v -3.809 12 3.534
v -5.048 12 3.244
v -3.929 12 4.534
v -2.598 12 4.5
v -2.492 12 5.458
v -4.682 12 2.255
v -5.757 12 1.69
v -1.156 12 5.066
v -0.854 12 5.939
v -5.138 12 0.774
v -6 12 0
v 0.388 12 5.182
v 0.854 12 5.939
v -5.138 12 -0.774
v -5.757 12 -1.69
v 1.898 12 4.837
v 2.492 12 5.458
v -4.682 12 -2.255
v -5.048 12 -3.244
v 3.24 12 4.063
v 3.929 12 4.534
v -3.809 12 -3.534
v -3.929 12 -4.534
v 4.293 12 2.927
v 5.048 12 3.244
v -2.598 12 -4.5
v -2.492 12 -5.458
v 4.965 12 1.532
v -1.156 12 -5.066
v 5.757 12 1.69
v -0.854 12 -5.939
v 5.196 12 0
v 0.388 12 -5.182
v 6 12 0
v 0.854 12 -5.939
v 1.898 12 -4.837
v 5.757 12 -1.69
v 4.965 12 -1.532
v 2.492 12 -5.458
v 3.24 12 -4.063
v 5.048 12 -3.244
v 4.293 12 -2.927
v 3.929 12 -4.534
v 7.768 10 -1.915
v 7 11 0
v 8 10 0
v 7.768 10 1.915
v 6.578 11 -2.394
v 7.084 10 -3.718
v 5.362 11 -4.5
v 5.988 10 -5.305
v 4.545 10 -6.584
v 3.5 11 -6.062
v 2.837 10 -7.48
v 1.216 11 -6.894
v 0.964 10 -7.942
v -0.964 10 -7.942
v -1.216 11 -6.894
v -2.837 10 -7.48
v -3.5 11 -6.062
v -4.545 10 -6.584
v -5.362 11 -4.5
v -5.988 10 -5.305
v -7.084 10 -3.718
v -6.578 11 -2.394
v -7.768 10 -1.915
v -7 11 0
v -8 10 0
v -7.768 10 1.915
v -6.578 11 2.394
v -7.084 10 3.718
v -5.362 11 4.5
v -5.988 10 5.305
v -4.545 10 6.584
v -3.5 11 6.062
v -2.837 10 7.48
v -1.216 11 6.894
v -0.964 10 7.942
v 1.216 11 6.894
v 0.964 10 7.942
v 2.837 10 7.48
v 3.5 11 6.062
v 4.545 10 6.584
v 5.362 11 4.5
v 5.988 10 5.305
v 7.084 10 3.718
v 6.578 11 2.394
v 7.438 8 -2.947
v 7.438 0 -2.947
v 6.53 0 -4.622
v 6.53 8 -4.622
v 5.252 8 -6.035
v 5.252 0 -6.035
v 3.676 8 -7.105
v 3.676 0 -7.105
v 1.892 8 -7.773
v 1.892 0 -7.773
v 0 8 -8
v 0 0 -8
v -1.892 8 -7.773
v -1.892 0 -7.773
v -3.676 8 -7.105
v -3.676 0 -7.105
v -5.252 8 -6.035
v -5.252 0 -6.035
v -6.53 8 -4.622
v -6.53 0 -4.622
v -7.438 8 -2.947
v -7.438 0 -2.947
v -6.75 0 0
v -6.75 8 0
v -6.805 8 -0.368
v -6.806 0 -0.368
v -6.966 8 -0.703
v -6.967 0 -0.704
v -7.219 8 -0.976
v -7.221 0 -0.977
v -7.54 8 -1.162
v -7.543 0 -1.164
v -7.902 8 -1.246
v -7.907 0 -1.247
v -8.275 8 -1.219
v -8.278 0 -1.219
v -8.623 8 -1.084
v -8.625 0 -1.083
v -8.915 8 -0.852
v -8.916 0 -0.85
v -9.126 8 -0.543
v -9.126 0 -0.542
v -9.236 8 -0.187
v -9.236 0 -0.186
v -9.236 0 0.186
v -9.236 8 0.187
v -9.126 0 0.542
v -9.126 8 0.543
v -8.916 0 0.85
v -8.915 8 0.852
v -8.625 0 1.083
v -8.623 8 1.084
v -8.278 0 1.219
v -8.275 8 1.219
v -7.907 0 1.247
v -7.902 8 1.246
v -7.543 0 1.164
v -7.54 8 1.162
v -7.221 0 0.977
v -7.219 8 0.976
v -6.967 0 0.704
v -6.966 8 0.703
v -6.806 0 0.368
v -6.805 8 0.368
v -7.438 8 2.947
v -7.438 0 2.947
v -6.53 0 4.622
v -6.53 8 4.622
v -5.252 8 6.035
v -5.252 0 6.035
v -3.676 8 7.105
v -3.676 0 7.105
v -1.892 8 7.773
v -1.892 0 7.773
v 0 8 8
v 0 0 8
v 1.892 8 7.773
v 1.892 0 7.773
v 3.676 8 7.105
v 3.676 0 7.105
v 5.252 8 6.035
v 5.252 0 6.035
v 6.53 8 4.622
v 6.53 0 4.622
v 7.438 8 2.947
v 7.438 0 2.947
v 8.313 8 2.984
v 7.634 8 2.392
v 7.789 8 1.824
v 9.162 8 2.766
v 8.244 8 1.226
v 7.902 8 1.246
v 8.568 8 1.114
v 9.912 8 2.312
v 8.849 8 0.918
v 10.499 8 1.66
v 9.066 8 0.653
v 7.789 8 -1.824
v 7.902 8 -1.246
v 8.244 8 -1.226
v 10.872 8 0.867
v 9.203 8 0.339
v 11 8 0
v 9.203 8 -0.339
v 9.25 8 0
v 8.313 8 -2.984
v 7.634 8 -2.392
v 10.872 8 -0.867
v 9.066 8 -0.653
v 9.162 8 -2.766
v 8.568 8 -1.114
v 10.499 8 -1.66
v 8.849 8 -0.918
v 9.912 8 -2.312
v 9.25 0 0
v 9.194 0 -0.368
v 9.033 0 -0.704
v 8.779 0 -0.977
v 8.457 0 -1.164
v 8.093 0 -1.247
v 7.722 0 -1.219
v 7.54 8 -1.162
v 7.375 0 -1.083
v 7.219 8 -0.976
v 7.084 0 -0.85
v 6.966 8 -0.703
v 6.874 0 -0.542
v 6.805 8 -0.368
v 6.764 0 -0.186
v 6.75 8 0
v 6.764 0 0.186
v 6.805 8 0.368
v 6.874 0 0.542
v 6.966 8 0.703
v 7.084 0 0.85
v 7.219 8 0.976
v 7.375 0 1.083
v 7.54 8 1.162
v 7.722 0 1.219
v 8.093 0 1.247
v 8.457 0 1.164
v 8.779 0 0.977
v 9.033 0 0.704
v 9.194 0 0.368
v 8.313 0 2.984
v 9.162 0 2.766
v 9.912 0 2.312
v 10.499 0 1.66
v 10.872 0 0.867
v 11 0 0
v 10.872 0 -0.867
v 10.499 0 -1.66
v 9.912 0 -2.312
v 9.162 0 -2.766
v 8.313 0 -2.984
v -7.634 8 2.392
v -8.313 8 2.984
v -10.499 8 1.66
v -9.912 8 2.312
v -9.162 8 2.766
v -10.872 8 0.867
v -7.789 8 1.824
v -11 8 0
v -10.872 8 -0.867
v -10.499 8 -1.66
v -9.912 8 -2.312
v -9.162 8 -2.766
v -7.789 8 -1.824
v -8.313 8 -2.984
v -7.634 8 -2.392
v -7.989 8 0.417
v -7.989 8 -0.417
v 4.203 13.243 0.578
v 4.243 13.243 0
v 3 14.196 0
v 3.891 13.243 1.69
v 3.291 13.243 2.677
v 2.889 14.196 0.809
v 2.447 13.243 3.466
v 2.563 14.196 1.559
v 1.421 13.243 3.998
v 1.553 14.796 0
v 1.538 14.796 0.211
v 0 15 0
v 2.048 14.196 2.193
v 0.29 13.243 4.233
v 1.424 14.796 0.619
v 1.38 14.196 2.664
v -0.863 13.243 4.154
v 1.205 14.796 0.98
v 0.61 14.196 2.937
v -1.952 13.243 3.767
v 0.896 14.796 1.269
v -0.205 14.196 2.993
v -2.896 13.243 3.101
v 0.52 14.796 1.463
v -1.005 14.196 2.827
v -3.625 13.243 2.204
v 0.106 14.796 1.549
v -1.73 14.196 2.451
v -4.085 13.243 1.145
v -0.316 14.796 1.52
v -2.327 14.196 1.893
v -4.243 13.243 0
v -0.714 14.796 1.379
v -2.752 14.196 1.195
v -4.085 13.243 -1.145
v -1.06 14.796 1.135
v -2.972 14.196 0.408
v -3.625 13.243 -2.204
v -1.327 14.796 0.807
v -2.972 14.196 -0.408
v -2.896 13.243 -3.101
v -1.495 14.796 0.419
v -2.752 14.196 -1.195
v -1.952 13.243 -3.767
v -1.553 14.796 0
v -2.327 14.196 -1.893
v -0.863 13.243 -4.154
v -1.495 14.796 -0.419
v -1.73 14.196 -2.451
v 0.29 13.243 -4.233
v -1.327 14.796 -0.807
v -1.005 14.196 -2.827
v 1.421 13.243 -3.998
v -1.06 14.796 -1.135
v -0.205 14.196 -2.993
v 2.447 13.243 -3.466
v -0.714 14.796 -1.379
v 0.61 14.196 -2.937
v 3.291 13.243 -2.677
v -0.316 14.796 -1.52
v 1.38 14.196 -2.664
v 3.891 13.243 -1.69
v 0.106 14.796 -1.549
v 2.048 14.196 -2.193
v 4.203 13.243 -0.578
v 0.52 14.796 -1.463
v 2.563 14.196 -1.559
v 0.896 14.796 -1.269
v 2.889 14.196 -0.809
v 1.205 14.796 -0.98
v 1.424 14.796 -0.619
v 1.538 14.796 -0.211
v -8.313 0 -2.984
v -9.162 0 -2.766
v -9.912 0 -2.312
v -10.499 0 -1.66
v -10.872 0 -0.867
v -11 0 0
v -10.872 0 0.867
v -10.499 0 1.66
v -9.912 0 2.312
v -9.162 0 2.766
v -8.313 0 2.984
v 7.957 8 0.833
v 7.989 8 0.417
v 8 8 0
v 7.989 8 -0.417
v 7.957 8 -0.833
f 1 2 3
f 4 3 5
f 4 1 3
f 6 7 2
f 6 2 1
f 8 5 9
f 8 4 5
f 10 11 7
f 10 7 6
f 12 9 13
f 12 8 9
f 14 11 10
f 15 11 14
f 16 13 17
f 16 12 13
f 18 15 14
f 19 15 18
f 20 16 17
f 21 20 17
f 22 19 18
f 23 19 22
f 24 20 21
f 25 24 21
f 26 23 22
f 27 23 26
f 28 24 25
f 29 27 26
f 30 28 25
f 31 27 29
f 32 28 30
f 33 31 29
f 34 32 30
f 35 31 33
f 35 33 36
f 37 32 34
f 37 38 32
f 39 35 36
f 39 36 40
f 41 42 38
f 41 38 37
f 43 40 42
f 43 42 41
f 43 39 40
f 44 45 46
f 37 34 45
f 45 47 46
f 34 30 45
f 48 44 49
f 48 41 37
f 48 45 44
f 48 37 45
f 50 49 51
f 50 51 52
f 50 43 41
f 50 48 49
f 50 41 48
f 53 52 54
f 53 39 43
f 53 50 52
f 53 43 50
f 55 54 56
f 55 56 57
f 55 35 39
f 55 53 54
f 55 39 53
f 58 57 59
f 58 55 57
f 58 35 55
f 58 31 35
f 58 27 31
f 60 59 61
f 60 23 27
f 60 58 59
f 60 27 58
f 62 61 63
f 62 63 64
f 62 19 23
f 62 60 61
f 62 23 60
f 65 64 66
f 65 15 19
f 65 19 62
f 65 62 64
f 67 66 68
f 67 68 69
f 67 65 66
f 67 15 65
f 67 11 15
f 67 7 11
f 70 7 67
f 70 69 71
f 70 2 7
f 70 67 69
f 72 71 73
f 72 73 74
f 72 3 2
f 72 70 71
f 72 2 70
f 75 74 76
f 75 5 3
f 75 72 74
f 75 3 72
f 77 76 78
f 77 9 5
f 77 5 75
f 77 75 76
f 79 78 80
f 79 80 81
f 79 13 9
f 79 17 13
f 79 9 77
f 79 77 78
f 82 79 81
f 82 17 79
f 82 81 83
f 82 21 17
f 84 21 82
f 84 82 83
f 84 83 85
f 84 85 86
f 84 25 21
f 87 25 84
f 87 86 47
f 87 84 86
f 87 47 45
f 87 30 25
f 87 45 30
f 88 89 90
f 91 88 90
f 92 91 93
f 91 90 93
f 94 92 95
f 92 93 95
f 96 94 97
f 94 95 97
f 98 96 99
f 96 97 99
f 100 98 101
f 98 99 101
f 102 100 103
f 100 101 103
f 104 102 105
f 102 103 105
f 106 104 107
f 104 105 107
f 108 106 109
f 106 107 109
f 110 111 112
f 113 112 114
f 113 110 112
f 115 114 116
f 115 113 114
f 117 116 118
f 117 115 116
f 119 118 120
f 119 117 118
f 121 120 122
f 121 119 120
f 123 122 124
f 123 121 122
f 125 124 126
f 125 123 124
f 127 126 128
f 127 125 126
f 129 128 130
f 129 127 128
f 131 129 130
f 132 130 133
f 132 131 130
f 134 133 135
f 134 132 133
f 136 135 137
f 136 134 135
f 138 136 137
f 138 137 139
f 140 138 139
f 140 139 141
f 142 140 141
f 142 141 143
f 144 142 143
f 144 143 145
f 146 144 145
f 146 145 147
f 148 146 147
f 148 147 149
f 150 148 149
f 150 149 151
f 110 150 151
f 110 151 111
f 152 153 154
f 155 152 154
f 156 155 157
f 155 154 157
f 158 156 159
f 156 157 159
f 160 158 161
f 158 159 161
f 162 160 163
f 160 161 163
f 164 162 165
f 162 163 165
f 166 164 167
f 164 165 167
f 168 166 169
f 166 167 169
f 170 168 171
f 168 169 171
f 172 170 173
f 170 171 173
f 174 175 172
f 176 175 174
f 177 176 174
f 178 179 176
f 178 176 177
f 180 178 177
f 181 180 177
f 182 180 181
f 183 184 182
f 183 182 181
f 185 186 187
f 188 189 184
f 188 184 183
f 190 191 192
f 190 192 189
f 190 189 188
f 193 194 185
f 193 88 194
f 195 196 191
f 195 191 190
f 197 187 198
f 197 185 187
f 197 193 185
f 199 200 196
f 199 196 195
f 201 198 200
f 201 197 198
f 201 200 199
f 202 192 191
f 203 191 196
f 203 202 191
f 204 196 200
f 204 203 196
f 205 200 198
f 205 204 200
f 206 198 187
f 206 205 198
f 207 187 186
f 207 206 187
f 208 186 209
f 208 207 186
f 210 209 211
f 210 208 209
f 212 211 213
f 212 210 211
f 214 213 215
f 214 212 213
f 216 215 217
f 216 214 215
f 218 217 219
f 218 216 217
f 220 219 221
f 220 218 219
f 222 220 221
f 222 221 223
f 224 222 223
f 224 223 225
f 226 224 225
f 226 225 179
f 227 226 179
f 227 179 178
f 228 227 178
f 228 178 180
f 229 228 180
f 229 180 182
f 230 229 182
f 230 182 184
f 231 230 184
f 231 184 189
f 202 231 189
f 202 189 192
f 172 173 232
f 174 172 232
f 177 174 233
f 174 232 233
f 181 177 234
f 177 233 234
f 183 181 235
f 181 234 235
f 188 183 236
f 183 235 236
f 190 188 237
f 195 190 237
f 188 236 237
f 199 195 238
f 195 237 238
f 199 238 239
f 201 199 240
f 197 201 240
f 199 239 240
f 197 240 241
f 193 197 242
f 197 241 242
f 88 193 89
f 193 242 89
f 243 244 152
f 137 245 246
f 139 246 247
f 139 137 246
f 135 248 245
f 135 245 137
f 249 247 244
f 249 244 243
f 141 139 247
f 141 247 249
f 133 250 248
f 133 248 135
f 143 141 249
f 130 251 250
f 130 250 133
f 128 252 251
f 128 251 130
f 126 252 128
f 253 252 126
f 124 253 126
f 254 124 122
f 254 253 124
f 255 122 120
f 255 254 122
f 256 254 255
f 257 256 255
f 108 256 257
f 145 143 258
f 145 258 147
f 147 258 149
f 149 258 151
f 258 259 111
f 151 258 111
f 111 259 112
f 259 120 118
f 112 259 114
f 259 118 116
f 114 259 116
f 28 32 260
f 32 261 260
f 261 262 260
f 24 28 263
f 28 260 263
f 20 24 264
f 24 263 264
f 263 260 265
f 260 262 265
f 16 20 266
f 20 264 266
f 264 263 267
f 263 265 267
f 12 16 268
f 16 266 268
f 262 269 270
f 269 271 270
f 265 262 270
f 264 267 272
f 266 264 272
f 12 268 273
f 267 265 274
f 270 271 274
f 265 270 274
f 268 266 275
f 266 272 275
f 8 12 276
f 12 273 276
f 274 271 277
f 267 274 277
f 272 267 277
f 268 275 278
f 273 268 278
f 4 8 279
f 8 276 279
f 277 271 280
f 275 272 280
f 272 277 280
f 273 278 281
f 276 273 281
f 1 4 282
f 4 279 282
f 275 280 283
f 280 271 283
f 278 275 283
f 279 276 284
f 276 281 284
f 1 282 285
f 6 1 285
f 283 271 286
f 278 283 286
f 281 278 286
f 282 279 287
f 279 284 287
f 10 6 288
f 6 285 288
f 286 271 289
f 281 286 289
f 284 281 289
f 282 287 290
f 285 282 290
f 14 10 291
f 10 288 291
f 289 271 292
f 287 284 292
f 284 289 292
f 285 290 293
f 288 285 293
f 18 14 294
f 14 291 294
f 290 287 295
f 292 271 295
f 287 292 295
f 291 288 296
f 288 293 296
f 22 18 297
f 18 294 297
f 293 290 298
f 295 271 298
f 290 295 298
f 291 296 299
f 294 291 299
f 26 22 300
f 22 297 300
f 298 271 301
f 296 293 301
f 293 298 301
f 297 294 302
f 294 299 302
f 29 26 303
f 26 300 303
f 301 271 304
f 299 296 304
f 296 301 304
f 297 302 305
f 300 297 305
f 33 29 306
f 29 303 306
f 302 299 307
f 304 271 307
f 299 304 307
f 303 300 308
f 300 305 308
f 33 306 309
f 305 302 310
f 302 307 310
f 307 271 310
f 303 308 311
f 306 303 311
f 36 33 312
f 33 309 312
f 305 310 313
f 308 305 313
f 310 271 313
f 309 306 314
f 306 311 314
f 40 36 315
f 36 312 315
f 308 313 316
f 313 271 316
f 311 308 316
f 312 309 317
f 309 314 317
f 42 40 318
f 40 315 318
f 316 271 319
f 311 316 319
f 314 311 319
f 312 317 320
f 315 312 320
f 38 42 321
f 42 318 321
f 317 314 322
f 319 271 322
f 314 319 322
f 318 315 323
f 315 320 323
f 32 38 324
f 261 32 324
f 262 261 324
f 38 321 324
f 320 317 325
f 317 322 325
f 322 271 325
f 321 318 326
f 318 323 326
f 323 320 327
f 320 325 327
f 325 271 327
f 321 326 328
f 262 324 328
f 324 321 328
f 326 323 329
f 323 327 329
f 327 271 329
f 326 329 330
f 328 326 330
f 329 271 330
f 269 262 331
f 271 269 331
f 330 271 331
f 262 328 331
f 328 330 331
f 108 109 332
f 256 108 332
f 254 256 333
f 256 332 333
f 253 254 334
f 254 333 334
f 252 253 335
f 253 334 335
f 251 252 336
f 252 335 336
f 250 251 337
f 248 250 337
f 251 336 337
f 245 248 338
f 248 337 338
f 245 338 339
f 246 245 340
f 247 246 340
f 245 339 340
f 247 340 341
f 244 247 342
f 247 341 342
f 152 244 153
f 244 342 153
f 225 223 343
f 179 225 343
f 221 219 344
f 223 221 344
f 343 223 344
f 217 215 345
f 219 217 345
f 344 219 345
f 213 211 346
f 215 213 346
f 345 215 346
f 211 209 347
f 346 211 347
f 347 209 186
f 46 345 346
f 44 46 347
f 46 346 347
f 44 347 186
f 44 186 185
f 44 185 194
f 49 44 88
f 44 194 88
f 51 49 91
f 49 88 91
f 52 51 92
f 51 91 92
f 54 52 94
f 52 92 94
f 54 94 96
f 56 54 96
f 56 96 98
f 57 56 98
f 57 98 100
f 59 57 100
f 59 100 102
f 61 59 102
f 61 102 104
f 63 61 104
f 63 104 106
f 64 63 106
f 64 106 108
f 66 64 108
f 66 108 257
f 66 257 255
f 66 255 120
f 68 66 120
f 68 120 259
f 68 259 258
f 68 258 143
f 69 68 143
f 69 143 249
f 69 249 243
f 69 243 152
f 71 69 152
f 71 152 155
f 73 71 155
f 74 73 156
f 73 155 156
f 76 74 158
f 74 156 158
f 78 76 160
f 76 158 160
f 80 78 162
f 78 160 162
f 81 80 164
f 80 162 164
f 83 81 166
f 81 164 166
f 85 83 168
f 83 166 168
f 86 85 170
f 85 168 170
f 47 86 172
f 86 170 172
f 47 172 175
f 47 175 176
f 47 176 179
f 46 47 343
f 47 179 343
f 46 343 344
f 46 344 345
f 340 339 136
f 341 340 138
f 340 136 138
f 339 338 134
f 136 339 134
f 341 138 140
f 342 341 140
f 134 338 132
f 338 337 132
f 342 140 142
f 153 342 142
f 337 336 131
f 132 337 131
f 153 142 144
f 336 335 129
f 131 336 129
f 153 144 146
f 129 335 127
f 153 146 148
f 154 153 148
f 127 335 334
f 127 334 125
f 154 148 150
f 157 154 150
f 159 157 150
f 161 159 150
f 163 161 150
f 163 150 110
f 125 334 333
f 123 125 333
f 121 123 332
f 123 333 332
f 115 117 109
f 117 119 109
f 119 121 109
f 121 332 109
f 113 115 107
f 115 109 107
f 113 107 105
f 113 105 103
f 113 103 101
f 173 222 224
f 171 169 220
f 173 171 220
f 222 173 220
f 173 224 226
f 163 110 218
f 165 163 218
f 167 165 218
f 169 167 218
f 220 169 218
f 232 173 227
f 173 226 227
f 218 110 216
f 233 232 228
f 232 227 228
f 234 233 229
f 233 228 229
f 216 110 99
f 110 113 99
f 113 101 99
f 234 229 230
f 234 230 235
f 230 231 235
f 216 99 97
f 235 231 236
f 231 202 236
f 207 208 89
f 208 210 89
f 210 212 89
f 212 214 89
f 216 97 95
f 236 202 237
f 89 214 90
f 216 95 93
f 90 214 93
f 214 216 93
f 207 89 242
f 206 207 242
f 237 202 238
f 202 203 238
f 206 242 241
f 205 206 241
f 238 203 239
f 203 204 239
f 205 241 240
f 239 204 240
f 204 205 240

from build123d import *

# Parameters (mm, degrees)
SKETCH1_R           = 1.25
BOSS_EXTRUDE1_DEPTH = 8
SKETCH2_R           = 8
BOSS_EXTRUDE2_DEPTH = 4
CHAMFER1_SIZE       = 2


with BuildPart() as part:
    # Sketch1 → Boss-Extrude1 (new body)
    with BuildSketch(Plane(origin=(0, 0, 0), x_dir=(1, 0, 0), z_dir=(0, 1, 0))):
        with BuildLine():
            ThreePointArc((7.4375, -2.946793809), (11, 0), (7.4375, 2.946793809))
            ThreePointArc((7.4375, 2.946793809), (0, 8), (-7.4375, 2.946793809))
            ThreePointArc((-7.4375, 2.946793809), (-11, 0), (-7.4375, -2.946793809))
            ThreePointArc((-7.4375, -2.946793809), (0, -8), (7.4375, -2.946793809))
        make_face()
        with Locations((8, 0)):
            Circle(SKETCH1_R, mode=Mode.SUBTRACT)
        with Locations((-8, 0)):
            Circle(SKETCH1_R, mode=Mode.SUBTRACT)
    extrude(amount=BOSS_EXTRUDE1_DEPTH)

    # Sketch2 → Boss-Extrude2 (add)
    with BuildSketch(Plane(origin=(0, 8, 0), x_dir=(1, 0, 0), z_dir=(0, 1, 0))):
        Circle(SKETCH2_R)
    extrude(amount=BOSS_EXTRUDE2_DEPTH)

    # Chamfer1
    chamfer1_edges = [part.edges().sort_by_distance(p)[0] for p in [
        (-8, 12, 0),
    ]]
    chamfer(chamfer1_edges, length=CHAMFER1_SIZE)

    # Sketch3 → Revolve2 (revolve)
    with BuildSketch(Plane.XY):
        with BuildLine():
            Line((0, 15), (0, 3))
            ThreePointArc((0, 3), (6, 9), (0, 15))
        make_face()
    revolve(axis=Axis((0, 12, 0), (0, -1, 0)))


solid = part.part
